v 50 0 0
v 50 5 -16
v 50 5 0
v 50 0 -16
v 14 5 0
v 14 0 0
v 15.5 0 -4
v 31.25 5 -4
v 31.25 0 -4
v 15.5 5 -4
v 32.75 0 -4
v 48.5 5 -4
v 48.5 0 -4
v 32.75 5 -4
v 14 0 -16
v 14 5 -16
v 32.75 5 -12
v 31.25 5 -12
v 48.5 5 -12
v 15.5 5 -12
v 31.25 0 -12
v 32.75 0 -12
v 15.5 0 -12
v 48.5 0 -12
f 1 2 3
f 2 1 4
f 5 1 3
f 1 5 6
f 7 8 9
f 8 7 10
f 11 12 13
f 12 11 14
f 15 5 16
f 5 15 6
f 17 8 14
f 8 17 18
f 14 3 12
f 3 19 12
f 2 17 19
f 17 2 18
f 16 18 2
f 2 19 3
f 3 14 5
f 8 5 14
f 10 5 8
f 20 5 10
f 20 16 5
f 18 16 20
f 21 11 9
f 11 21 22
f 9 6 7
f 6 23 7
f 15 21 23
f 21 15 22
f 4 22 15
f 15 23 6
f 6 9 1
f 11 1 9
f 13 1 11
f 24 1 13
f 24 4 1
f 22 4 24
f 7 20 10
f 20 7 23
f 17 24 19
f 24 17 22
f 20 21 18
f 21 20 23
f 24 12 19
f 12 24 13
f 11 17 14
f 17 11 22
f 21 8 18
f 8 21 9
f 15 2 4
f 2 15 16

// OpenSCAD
$fn = 100;

gopro_extent = 20;

base_length = 50;
skid_length = 36;
base_width = 50;
skid_width = 5;
base_height = 4;
skid_height = 8;

strength_mount = 4;
strength_dampers = 1.5;


//translate([10, base_width/2. - 7.5, base_height + gopro_extent]) rotate([0, 90, 90]) gopro_mount();
//base_plate();
skid();
//translate([0, base_width - skid_width]) skid();


module gopro_mount(){
    translate([0, 0, 0]) mount_element();
    translate([0, 0, 6]) mount_element();
    translate([0, 0, 12]) mount_element();
}

module mount_element(){
    linear_extrude(height=3){
        difference(){
            union(){
                circle(15/2.);
                translate([0, -7.5]) square([gopro_extent, 15]);
            }
            teardrop(5.4/2.);
            //circle(5.4/2.);
        }
    }
}

module teardrop(radius){
    union(){
        circle(radius);
        polygon(points=[[-.5*radius, -.8*radius], [-.5*radius, .8*radius], [-1.3*radius, 0.]]);
    }
}

module base_plate(){
    difference(){
        cube([base_length, base_width, base_height]);
        translate([4, skid_width, -base_height]) cube([base_length - 8, 4, 3*base_height]);
        translate([4, base_width - skid_width - 4, -base_height]) cube([base_length - 8, 4, 3*base_height]);
    }
}

module skid(){
    translate([base_length - skid_length, 0, -strength_mount])
        cube([skid_length, skid_width, strength_mount]);
    translate([base_length - skid_length, 0, -strength_mount - skid_height])
        cube([strength_dampers, skid_width, skid_height]);
    translate([base_length - strength_dampers, 0, -strength_mount - skid_height])
        cube([strength_dampers, skid_width, skid_height]);
    translate([base_length - .5*skid_length - .5*strength_dampers, 0, -strength_mount - skid_height])
        cube([strength_dampers, skid_width, skid_height]);
    translate([base_length - skid_length, 0, -2.*strength_mount - skid_height])
        cube([skid_length, skid_width, strength_mount]);
}
